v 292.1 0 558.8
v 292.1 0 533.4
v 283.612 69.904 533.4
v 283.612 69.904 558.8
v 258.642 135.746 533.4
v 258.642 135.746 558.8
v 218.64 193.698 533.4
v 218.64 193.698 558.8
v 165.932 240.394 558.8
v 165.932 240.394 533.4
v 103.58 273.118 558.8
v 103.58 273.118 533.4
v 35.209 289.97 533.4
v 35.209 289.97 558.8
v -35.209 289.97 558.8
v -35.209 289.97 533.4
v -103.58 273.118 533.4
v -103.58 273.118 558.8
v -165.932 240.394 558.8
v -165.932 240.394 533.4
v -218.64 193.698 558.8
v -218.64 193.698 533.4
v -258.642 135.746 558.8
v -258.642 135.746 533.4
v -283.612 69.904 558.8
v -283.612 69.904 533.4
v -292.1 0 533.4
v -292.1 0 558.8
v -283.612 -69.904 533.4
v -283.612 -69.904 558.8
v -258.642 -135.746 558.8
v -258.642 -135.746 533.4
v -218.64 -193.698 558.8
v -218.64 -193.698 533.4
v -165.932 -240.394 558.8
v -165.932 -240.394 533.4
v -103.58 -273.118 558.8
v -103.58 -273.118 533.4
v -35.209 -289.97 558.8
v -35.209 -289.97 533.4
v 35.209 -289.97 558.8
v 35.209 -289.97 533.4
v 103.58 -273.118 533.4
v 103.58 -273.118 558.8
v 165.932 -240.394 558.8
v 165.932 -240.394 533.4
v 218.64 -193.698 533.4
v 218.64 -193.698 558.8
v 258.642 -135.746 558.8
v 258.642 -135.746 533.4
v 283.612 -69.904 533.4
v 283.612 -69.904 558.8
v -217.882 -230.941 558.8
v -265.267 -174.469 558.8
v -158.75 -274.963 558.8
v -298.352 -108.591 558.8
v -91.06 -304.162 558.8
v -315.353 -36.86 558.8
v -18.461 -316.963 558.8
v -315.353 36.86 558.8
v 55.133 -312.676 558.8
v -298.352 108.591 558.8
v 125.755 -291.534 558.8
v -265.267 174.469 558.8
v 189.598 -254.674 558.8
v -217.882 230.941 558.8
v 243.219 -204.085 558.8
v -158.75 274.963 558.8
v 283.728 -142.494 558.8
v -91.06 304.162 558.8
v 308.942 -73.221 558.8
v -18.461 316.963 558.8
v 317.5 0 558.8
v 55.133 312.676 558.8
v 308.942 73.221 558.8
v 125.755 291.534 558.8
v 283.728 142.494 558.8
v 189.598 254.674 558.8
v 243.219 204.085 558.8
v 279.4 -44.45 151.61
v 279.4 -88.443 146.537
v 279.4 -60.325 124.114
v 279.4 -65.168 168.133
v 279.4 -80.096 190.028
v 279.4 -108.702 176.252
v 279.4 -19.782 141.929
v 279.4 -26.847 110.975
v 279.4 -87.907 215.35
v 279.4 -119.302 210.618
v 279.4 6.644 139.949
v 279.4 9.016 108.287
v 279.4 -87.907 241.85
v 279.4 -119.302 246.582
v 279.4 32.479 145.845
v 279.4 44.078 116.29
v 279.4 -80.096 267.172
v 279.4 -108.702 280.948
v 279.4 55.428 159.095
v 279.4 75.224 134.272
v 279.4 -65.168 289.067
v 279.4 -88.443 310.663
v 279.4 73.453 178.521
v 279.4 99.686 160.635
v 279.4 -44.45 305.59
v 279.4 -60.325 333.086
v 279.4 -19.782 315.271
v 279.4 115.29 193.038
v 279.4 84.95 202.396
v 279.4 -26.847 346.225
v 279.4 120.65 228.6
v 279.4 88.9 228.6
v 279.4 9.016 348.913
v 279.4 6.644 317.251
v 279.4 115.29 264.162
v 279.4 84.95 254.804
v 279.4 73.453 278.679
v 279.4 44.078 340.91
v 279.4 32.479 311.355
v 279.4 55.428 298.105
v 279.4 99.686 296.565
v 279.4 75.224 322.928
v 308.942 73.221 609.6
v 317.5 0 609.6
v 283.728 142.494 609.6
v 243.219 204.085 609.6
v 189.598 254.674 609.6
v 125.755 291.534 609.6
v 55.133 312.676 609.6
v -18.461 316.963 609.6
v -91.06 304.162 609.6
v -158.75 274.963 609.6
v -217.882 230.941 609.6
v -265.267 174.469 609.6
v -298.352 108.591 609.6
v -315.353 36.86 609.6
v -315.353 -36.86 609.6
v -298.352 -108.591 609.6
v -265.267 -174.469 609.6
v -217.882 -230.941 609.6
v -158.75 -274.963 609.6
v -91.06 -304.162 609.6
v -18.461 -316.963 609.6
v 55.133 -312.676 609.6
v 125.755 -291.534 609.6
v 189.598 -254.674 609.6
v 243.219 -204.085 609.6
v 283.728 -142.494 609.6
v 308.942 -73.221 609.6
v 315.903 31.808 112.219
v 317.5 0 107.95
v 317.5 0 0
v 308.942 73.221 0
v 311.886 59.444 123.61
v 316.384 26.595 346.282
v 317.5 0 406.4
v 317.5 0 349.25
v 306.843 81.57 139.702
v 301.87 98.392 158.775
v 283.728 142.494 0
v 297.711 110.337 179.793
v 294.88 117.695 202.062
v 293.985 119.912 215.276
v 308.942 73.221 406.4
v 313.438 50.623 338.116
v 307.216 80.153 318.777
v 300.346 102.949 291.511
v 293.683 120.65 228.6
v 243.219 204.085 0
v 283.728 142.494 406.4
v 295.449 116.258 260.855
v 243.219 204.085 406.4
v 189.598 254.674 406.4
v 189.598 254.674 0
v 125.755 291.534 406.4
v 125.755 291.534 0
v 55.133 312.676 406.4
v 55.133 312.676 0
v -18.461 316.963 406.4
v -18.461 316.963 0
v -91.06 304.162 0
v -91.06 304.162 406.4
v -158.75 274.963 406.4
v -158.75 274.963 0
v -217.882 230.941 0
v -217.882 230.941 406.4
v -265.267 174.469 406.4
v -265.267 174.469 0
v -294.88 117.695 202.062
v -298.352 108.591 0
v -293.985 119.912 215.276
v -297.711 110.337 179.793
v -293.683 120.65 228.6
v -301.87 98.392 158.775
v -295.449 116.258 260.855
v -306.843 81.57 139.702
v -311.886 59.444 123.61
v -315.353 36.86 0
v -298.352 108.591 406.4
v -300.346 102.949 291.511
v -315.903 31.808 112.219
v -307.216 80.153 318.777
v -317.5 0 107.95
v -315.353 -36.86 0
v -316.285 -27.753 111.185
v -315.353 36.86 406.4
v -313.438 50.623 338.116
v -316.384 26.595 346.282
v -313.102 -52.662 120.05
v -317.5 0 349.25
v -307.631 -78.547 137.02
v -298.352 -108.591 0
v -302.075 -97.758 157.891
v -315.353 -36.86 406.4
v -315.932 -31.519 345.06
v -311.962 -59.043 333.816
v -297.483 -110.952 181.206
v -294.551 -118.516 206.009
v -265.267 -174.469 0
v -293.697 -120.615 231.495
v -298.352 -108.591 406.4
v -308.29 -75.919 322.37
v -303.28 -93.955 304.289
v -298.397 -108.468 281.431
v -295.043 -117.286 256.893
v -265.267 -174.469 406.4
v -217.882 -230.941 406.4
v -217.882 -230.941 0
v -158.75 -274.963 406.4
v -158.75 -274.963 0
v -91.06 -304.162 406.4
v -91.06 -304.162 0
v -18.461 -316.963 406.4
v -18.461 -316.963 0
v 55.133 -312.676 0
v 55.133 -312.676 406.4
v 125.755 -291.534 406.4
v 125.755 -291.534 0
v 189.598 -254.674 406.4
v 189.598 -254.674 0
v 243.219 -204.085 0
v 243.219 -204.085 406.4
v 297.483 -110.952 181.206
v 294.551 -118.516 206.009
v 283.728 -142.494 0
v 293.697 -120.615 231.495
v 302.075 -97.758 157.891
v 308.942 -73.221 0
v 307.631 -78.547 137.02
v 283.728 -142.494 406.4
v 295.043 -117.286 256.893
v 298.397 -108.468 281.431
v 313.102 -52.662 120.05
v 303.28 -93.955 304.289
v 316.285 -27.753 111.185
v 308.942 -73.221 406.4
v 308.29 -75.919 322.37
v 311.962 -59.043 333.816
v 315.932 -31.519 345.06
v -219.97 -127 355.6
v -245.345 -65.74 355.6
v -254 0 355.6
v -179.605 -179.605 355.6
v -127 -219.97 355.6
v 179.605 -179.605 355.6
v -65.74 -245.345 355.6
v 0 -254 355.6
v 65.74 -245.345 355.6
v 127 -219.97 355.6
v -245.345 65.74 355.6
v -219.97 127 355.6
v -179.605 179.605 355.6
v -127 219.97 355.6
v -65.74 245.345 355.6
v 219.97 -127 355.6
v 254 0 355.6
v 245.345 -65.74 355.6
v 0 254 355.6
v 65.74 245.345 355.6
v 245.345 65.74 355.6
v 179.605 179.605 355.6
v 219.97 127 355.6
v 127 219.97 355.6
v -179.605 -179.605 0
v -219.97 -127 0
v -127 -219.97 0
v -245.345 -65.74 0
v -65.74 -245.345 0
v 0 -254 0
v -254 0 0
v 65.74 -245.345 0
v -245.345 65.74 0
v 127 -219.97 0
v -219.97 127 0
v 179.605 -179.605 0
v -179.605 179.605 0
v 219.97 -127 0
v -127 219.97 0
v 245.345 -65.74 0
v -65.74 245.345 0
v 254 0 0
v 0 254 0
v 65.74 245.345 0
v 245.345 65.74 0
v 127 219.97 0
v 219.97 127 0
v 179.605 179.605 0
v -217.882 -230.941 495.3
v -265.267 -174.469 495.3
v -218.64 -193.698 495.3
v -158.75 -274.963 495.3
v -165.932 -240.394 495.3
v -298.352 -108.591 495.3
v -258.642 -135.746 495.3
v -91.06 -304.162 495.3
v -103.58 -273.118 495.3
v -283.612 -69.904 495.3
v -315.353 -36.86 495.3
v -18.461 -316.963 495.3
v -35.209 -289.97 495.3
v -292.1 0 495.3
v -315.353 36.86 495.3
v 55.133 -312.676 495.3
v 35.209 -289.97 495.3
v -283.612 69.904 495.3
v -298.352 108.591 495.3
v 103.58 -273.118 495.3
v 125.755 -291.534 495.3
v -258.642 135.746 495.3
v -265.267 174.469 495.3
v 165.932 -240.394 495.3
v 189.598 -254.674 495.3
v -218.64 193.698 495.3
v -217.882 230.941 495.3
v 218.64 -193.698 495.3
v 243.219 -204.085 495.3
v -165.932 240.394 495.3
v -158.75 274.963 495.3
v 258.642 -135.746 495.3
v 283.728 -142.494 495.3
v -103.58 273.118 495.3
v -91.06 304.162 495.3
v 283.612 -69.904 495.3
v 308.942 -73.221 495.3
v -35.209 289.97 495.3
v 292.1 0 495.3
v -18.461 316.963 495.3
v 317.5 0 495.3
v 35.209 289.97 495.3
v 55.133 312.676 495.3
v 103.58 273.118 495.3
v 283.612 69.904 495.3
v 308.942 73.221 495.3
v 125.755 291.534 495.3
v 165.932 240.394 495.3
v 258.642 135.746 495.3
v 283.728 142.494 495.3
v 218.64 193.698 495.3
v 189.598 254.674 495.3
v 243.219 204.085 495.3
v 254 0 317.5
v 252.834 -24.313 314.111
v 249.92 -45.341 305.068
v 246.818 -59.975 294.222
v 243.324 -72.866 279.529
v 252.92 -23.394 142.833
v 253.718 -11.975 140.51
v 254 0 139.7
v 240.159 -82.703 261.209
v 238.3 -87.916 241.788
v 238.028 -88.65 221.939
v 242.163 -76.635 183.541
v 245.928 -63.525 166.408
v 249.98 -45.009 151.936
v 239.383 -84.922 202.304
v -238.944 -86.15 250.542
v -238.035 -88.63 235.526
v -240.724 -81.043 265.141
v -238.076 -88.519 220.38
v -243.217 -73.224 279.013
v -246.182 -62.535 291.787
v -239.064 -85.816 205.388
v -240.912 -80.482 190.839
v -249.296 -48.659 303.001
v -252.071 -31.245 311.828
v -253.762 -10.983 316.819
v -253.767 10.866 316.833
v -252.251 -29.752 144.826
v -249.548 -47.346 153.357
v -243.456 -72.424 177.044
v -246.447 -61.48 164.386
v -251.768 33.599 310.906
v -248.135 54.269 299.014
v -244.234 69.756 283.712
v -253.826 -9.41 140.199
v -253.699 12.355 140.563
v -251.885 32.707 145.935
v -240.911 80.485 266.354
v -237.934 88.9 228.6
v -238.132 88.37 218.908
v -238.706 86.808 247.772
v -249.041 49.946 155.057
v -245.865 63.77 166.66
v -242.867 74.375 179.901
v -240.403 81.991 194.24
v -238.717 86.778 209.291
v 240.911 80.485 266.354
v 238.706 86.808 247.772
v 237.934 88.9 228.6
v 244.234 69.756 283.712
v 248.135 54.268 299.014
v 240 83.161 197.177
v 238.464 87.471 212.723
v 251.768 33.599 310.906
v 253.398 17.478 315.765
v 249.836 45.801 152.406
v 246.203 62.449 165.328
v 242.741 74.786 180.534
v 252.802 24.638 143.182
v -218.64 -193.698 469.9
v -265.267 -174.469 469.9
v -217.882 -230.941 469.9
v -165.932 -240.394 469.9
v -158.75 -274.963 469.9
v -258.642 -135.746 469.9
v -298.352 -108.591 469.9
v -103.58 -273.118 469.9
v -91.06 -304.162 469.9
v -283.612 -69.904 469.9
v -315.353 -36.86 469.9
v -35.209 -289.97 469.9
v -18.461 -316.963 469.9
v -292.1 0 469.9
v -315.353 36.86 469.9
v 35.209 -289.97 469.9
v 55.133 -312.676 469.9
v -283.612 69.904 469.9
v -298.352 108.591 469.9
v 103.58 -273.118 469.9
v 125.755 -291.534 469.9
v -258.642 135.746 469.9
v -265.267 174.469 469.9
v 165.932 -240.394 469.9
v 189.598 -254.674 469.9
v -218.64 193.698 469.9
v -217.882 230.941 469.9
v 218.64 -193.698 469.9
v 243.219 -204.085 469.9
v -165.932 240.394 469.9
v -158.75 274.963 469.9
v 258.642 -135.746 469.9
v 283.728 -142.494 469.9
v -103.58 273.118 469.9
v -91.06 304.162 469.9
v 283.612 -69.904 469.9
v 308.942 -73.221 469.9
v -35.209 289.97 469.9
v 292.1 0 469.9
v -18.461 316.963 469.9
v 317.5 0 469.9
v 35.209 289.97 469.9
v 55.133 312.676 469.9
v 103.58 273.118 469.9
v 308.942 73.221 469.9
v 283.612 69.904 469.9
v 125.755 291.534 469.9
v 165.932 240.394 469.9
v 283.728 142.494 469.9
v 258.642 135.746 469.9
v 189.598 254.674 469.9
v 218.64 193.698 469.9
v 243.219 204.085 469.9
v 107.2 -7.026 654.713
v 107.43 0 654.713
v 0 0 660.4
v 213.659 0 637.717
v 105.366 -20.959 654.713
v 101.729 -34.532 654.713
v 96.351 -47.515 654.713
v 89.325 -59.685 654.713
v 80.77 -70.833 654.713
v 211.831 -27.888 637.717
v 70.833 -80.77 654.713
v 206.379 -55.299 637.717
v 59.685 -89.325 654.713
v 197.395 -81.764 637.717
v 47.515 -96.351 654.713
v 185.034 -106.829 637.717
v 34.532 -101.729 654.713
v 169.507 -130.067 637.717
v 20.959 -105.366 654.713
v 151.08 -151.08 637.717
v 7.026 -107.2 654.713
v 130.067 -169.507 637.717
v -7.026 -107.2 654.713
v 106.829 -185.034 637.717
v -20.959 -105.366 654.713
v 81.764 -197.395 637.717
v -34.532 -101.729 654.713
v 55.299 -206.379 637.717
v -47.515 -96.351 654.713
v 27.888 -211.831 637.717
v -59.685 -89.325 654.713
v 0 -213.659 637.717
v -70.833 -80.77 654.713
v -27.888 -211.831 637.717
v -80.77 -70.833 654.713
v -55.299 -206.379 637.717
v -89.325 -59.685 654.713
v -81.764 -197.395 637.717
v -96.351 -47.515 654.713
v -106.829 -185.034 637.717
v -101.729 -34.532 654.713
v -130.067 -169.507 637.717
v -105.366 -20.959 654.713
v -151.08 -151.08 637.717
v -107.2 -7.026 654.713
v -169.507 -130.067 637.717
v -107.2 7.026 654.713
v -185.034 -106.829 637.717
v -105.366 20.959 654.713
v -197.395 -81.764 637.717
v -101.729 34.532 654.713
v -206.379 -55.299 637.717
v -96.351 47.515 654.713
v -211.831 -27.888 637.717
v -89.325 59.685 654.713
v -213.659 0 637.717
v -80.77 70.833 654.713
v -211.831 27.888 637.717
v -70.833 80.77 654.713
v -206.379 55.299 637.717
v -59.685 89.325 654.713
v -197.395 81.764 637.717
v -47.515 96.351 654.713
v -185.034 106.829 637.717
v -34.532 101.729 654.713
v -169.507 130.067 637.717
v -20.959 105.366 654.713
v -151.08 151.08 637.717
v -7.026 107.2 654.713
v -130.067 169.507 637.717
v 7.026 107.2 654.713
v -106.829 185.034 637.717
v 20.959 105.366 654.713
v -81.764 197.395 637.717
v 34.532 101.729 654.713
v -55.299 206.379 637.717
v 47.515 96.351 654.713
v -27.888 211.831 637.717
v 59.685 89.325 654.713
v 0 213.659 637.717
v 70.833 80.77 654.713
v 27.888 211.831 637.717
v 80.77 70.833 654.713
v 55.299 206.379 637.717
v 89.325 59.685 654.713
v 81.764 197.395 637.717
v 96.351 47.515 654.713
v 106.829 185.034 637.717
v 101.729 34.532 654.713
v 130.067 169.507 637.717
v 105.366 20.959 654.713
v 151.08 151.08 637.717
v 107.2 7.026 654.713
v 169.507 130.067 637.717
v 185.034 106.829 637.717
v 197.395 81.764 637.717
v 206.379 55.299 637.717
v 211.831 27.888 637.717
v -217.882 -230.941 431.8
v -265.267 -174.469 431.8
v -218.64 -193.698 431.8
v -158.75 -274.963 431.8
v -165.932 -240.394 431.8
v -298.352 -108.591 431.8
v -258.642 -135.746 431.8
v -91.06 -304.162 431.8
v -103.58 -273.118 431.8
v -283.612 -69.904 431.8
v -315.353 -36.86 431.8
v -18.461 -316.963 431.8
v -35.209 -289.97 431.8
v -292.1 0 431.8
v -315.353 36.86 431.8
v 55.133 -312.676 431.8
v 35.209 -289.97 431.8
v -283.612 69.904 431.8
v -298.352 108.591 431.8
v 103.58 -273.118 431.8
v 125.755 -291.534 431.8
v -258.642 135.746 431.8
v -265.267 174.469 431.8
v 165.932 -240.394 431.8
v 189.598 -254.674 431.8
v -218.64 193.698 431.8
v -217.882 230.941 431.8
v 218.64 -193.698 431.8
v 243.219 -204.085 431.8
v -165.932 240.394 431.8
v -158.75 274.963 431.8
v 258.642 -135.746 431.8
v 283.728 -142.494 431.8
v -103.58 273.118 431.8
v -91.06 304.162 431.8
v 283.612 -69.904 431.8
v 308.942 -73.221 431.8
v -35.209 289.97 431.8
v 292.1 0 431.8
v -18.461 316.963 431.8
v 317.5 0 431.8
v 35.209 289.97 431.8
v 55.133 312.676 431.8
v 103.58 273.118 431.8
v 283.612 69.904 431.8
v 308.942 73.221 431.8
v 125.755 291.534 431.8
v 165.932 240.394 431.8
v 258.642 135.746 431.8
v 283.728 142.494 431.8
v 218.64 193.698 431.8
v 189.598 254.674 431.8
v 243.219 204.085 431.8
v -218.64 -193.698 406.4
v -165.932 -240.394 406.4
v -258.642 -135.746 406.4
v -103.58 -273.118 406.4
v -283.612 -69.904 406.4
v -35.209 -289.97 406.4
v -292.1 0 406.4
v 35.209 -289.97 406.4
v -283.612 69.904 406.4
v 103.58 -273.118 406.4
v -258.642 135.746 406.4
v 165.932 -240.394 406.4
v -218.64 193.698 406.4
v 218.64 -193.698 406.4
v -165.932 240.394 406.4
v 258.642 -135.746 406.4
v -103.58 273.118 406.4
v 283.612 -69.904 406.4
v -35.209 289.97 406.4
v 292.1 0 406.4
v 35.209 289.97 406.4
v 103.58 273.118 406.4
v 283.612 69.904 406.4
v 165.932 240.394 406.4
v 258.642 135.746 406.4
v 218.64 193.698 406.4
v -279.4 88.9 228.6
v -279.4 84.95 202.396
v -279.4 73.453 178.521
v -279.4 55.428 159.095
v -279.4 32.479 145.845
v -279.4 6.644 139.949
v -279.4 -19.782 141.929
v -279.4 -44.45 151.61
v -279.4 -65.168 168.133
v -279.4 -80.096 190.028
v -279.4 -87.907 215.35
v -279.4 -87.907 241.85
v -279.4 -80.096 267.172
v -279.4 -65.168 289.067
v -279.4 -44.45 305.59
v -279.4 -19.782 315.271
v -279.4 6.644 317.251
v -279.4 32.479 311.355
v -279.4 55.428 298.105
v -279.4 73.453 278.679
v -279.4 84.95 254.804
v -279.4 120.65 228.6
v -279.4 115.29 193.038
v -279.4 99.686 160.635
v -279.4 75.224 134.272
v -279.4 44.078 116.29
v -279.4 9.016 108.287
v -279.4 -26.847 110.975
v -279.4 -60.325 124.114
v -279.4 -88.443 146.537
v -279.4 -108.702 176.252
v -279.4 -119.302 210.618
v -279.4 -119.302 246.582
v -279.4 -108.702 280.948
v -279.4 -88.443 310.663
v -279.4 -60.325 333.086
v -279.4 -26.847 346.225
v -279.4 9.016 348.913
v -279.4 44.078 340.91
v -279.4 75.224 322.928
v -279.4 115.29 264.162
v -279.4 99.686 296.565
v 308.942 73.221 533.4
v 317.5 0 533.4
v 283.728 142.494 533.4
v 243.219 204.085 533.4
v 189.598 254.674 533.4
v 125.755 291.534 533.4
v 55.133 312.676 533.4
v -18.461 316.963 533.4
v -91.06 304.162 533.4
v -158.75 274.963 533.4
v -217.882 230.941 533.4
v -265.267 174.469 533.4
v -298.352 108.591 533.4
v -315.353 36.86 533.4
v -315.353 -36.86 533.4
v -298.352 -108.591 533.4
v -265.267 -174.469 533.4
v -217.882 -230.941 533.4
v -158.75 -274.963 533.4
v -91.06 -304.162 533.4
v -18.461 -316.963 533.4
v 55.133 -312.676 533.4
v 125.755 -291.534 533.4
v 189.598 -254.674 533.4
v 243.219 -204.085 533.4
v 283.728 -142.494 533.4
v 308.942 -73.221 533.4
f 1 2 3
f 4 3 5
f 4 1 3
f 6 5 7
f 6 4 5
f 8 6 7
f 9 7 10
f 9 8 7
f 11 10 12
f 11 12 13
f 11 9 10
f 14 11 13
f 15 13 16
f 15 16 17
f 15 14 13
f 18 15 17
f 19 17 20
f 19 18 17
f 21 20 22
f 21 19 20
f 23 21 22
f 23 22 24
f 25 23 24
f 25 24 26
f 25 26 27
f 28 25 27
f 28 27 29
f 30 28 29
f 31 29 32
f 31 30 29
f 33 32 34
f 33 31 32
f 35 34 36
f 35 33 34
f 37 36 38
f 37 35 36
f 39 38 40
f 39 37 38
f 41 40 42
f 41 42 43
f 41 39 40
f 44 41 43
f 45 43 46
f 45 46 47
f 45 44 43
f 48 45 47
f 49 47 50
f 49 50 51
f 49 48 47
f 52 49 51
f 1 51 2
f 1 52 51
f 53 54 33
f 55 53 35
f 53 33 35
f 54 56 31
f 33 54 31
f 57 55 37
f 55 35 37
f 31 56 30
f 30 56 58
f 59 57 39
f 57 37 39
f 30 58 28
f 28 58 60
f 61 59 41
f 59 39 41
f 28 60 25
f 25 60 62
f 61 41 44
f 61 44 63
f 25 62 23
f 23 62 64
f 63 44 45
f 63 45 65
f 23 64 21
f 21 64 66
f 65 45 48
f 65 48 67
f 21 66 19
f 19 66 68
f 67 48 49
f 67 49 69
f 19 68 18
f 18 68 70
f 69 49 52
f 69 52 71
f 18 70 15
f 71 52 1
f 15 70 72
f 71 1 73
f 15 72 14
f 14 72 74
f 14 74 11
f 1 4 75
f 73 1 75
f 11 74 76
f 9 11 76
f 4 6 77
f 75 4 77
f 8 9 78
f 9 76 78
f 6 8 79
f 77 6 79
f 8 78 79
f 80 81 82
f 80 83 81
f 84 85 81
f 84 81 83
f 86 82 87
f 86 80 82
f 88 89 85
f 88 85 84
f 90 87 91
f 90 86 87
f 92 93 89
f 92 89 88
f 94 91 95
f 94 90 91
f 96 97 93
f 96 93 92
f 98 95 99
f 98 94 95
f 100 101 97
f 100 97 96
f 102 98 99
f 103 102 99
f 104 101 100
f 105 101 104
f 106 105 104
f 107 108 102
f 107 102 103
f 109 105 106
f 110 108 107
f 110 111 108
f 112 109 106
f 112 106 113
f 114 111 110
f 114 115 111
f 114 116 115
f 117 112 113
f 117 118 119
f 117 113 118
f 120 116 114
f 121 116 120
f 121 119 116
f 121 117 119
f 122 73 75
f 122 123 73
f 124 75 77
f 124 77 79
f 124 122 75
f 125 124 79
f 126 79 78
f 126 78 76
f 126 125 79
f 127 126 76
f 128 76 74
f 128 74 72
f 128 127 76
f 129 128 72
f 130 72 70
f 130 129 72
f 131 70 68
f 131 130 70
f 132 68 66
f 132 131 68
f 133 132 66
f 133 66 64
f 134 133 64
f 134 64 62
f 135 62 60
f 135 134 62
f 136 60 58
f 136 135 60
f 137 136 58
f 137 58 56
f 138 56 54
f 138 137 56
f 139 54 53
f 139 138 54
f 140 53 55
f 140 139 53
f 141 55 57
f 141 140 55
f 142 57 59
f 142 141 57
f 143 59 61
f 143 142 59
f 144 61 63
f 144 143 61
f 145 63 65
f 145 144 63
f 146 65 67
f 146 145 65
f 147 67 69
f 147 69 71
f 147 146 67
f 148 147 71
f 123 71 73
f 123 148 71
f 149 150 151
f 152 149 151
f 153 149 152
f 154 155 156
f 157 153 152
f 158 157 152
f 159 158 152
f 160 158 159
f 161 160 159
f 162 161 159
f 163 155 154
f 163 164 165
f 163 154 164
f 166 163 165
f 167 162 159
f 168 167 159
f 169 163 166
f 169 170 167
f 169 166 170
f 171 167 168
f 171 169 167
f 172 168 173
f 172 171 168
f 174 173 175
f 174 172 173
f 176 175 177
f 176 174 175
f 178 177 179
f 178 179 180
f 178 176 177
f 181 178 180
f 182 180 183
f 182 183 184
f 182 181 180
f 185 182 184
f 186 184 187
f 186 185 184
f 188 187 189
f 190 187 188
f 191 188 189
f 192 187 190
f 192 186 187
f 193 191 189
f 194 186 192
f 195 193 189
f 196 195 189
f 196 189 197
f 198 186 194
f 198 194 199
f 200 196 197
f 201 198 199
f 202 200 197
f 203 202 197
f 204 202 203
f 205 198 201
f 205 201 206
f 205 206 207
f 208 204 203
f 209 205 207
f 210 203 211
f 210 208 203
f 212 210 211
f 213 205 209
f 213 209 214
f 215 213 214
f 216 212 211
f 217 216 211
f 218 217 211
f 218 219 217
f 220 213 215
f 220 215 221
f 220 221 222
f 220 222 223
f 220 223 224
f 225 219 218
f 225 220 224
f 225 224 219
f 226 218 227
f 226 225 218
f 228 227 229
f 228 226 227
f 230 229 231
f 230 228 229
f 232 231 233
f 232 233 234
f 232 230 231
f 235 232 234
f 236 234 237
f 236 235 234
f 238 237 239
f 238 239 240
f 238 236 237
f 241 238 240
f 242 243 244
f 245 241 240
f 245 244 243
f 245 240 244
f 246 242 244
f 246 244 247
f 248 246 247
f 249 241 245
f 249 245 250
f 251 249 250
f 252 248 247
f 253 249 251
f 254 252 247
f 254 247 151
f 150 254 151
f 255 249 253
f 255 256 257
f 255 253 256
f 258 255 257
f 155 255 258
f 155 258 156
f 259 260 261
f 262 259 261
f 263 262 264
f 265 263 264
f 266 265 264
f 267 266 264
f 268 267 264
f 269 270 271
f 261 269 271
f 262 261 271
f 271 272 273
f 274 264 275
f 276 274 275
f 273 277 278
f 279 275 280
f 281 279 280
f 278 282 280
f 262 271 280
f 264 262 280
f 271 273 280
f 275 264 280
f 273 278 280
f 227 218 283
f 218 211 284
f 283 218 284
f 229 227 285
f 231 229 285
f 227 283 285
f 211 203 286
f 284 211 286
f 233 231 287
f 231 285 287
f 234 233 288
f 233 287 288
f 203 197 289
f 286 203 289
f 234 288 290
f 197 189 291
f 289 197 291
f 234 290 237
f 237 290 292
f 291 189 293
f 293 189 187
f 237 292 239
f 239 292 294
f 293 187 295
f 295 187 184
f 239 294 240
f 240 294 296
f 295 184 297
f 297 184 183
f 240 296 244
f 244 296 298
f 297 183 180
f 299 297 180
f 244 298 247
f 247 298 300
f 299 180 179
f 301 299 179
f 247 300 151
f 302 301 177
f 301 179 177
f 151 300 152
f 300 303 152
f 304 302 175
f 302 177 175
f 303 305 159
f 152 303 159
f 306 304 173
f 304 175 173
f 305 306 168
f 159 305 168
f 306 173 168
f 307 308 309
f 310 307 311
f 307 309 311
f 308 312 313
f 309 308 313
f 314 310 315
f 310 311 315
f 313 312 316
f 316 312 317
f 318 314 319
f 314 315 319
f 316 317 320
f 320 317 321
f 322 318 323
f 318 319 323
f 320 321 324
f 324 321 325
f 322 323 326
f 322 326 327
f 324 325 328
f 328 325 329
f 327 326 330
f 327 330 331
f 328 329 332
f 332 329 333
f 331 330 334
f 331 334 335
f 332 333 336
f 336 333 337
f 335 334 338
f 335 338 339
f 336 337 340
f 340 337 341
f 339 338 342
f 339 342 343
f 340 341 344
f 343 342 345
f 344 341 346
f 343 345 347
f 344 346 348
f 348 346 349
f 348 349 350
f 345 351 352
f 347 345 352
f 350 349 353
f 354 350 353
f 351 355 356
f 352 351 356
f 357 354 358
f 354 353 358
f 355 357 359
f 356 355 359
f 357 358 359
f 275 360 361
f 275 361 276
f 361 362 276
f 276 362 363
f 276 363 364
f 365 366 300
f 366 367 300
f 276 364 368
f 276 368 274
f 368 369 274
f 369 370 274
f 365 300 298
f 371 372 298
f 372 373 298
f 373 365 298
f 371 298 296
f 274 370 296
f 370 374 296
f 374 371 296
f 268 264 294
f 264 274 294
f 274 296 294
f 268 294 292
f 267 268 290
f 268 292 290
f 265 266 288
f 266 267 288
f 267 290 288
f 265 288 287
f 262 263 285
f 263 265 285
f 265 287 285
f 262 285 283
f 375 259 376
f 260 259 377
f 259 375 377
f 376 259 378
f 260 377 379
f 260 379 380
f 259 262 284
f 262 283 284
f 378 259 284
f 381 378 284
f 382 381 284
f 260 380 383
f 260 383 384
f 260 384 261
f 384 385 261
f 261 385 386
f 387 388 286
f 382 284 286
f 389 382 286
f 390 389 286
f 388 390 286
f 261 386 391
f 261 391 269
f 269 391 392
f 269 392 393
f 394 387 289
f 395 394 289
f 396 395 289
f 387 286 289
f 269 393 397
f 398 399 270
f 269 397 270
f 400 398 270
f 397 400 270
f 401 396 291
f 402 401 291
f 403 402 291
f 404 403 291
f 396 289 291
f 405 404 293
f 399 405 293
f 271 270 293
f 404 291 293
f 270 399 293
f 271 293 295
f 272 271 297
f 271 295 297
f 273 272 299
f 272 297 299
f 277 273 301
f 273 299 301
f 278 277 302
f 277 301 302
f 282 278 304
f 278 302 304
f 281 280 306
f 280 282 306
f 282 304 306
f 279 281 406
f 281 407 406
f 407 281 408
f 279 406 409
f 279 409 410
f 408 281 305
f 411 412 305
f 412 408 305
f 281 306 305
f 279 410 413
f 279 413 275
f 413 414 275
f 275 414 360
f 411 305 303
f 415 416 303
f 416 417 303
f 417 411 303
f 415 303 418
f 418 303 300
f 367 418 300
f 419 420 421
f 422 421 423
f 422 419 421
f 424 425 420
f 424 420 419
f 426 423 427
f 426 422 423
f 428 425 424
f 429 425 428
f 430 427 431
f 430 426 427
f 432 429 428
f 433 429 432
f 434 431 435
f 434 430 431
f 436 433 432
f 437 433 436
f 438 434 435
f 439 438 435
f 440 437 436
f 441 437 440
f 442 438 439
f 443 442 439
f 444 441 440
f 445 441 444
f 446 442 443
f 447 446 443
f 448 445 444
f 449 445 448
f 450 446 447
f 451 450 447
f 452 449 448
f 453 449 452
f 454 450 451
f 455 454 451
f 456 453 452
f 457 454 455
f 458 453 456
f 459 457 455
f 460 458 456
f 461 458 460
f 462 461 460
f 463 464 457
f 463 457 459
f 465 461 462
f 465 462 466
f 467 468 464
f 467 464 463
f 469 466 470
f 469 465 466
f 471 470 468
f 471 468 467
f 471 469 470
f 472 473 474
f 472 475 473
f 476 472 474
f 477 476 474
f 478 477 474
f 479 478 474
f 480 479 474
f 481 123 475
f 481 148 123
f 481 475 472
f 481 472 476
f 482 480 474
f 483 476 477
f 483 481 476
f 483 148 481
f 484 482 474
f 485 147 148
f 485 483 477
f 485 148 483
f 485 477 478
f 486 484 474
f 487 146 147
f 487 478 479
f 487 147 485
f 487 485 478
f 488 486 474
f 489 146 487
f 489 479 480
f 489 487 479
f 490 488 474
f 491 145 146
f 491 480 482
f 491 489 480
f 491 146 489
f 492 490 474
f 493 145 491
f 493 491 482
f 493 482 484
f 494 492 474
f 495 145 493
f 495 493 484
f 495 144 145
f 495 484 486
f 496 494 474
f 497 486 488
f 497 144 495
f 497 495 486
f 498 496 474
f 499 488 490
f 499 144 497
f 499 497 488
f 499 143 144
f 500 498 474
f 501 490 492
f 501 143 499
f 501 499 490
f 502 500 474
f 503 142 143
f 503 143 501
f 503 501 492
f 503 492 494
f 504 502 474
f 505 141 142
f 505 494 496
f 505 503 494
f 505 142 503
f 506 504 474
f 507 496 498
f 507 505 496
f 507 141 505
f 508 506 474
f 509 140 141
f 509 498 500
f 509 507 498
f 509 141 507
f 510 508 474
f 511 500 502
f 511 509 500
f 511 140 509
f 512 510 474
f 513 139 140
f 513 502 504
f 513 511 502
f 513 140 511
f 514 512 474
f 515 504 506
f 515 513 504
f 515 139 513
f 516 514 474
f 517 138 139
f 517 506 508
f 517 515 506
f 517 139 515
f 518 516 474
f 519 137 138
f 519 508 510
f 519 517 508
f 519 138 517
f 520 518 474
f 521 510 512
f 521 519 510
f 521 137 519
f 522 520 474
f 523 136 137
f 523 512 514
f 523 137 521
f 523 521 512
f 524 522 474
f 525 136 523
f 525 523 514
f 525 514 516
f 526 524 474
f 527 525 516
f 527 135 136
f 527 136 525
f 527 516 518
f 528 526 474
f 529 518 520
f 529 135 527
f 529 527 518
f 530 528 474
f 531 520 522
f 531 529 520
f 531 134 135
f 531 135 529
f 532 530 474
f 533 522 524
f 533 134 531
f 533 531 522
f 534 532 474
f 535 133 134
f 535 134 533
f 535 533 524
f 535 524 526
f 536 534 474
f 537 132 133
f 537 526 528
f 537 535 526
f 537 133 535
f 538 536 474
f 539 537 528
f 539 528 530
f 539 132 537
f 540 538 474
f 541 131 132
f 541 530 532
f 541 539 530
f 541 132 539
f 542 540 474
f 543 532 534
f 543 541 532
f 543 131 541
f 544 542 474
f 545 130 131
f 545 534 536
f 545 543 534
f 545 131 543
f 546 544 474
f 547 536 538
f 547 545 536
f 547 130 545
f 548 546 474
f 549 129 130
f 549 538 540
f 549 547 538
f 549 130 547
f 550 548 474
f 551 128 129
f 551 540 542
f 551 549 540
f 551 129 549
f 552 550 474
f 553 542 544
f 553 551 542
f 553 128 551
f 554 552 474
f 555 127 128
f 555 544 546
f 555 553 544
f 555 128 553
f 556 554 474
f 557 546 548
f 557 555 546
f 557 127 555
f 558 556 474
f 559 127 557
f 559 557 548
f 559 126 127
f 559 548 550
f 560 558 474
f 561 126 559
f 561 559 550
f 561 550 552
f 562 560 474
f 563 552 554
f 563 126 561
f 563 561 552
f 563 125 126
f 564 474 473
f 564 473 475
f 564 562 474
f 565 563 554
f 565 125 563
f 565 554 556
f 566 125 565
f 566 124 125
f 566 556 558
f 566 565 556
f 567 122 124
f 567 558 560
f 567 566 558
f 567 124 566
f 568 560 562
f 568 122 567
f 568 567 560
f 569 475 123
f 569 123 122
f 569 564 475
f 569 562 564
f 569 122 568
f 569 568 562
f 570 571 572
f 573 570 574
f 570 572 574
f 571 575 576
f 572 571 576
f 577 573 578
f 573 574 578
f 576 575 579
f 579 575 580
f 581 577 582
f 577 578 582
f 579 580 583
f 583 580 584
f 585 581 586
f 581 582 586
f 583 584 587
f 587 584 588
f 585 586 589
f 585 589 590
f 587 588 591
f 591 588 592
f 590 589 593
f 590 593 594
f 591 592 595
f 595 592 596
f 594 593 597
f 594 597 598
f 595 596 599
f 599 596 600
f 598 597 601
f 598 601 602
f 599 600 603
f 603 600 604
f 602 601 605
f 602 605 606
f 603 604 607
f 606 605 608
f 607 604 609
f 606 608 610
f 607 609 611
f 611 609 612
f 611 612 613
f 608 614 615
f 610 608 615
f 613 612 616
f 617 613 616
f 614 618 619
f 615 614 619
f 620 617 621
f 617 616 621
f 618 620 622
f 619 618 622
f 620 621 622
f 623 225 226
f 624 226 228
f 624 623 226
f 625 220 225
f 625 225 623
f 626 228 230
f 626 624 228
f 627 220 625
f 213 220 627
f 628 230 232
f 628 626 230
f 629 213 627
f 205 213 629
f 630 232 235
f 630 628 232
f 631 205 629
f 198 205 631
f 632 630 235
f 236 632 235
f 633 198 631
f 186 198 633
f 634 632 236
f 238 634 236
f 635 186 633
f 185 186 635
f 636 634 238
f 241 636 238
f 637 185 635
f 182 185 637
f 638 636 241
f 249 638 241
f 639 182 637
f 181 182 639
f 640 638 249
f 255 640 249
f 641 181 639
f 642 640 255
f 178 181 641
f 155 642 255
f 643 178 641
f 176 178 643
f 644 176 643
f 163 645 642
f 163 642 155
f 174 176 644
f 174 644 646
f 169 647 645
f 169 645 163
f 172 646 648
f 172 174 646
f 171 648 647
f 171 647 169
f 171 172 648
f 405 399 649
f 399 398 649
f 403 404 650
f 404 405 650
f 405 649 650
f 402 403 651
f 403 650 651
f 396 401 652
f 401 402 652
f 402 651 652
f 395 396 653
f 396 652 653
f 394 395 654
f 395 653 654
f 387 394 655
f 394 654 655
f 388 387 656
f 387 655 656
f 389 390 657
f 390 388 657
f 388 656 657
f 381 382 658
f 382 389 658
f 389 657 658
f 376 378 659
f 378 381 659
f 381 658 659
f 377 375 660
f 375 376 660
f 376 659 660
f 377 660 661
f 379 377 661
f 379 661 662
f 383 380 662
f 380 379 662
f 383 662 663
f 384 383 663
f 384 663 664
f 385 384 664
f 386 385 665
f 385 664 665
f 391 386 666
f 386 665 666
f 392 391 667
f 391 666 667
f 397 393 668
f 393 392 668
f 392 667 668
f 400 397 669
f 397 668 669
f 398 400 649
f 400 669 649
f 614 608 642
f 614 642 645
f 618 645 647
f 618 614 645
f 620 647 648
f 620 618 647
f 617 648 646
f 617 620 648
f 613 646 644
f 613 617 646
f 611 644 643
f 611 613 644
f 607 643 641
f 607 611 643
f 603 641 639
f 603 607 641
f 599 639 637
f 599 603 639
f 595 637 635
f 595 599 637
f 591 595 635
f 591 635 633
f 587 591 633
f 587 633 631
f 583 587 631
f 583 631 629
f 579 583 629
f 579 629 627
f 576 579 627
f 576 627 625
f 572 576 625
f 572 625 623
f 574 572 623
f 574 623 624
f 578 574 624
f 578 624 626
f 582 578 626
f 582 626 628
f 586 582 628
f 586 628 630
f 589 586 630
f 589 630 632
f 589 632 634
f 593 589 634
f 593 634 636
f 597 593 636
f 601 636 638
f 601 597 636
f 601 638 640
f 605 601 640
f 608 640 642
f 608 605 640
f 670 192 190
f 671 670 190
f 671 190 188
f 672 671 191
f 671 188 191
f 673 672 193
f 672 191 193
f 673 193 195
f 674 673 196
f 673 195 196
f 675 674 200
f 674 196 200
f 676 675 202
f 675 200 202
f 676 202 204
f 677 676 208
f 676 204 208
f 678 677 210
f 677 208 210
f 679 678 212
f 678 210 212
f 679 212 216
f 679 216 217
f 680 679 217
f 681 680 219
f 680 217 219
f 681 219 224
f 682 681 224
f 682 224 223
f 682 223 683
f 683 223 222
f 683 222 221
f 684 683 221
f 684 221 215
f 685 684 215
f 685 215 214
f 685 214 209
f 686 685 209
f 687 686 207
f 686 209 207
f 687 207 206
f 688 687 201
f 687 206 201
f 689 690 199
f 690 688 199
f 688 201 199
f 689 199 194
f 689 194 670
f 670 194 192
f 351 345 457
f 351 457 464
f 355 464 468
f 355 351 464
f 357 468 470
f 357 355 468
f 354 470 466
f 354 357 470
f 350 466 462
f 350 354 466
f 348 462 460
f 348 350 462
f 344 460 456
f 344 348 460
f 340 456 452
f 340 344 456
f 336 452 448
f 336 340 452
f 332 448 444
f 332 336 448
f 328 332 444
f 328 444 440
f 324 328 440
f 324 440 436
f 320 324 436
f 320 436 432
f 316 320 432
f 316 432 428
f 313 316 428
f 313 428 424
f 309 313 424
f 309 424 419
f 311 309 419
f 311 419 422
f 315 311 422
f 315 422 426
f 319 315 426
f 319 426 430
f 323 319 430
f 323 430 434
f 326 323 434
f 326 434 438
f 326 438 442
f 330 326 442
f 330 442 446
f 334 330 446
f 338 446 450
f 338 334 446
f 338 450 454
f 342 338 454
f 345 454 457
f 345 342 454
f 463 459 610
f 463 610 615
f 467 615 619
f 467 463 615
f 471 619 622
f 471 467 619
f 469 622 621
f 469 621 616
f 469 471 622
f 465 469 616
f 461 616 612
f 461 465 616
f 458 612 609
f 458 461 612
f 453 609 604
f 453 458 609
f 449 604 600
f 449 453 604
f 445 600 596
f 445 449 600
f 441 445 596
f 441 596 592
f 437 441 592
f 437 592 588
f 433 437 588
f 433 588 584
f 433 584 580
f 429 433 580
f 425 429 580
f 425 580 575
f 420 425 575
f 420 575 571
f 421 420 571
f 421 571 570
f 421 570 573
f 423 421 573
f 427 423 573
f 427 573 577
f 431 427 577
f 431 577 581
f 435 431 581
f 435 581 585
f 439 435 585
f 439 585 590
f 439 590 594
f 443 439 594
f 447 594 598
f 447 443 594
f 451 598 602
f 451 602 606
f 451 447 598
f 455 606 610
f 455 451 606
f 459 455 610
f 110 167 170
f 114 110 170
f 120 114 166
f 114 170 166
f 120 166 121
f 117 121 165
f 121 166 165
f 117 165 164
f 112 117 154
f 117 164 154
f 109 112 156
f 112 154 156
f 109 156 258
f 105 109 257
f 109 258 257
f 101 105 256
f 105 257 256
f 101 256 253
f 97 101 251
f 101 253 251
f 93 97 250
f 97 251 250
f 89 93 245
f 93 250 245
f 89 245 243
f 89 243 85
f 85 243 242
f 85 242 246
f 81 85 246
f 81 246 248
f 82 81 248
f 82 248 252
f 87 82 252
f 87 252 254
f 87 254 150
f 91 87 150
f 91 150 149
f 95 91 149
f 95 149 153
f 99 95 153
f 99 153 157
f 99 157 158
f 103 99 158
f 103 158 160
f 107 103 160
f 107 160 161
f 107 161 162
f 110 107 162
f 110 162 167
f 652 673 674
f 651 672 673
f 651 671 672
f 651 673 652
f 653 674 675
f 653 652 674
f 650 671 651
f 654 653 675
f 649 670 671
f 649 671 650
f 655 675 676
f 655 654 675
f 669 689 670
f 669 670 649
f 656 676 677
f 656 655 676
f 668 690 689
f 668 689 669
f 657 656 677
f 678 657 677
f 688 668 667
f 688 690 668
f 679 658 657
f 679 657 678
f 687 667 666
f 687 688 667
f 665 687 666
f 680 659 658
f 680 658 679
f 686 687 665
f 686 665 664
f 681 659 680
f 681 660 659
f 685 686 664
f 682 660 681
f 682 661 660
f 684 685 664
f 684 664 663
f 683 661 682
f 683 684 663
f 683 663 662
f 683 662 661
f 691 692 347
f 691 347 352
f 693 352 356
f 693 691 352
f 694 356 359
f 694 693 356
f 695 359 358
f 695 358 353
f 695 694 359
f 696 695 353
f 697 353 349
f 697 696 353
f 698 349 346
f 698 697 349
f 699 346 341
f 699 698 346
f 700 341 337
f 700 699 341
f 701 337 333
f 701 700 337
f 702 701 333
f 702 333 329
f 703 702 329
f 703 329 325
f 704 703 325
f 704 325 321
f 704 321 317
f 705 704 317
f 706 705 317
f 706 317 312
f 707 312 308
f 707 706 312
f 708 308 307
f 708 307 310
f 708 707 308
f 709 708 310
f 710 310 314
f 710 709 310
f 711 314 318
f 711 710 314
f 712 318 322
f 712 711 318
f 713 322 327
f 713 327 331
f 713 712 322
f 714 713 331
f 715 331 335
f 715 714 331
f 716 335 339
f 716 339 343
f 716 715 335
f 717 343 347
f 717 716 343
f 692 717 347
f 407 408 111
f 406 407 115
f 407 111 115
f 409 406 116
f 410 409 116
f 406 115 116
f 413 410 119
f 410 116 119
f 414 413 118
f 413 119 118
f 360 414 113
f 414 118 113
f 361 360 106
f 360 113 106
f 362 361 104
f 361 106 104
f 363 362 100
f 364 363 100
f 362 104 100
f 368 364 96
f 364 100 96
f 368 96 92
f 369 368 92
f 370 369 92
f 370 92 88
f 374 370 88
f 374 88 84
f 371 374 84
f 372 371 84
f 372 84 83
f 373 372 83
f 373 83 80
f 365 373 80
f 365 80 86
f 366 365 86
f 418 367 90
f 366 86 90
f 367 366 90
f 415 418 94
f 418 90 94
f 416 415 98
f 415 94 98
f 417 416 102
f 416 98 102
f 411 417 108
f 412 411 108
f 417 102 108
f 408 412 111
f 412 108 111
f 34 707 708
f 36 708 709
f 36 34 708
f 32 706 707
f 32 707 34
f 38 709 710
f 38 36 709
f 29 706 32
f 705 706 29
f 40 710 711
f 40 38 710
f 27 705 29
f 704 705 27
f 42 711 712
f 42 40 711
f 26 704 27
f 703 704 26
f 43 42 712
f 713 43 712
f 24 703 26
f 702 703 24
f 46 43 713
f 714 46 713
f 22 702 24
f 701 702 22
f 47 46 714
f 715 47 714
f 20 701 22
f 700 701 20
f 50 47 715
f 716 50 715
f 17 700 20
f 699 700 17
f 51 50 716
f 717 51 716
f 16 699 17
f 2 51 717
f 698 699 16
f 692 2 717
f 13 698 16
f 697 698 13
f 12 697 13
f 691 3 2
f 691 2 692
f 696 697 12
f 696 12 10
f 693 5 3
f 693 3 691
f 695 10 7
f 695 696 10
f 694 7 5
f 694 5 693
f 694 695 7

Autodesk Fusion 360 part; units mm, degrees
sketch "Sketch1" plane through (0, 0, 0) normal (0, 1, 0) x (1, 0, 0)
  line L0 (0, 0) -> (0, -408.4277) construction
  line L1 (0, -660.4) -> (0, -355.6)
  line L2 (0, -355.6) -> (254, -355.6)
  line L3 (254, -355.6) -> (254, 0)
  line L4 (254, 0) -> (317.5, 0)
  line L5 (317.5, 0) -> (317.5, -406.4)
  line L6 (317.5, -406.4) -> (292.1, -406.4)
  line L7 (292.1, -406.4) -> (292.1, -431.8)
  line L8 (292.1, -431.8) -> (317.5, -431.8)
  line L9 (317.5, -431.8) -> (317.5, -469.9)
  line L10 (317.5, -469.9) -> (292.1, -469.9)
  line L11 (292.1, -469.9) -> (292.1, -495.3)
  line L12 (292.1, -495.3) -> (317.5, -495.3)
  line L13 (317.5, -495.3) -> (317.5, -533.4)
  line L14 (317.5, -533.4) -> (292.1, -533.4)
  line L15 (292.1, -533.4) -> (292.1, -558.8)
  line L16 (292.1, -558.8) -> (317.5, -558.8)
  line L17 (317.5, -558.8) -> (317.5, -609.6)
  arc A0 (0, -660.4) -> (317.5, -609.6) centre (0, 357.1875) ccw
  line L18 (0, -660.4) -> (-298.2009, -660.4) construction
  dimension "d1" = 508
  dimension "d2" = 635
  dimension "d3" = 355.6
  dimension "d4" = 406.4
  dimension "d5" = 25.4
  dimension "d6" = 25.4
  dimension "d7" = 38.1
  dimension "d8" = 50.8
  dimension "d9" = 660.4
revolve "Revolve1" add sketch "Sketch1" angle 360 about axis through (0, 0, 0) along (0, 0, 1)
ref_plane "WorkPlane1" through (317.5, 0, 0) normal (1, 0, 0) x (0, 1, 0)
sketch "Sketch2" plane through (317.5, 0, 0) normal (1, 0, 0) x (0, 1, 0)
  circle A0 centre (0, 228.6) radius 120.65
  dimension "d12" = 241.3
  dimension "d13" = 228.6
extrude "Extrude1" cut sketch "Sketch2" against normal blind 38.1
sketch "Sketch3" plane through (279.4, 0, 0) normal (1, 0, 0) x (0, 1, 0)
  circle A0 centre (0, 228.6) radius 120.65
  circle A1 centre (0, 228.6) radius 88.9
  dimension "d16" = 177.8
extrude "Extrude2" cut sketch "Sketch3" against normal blind 127 contours A1
mirror "Mirror1" about plane through (0, 0, 0) normal (1, 0, 0) of "Extrude1", "Extrude2"
